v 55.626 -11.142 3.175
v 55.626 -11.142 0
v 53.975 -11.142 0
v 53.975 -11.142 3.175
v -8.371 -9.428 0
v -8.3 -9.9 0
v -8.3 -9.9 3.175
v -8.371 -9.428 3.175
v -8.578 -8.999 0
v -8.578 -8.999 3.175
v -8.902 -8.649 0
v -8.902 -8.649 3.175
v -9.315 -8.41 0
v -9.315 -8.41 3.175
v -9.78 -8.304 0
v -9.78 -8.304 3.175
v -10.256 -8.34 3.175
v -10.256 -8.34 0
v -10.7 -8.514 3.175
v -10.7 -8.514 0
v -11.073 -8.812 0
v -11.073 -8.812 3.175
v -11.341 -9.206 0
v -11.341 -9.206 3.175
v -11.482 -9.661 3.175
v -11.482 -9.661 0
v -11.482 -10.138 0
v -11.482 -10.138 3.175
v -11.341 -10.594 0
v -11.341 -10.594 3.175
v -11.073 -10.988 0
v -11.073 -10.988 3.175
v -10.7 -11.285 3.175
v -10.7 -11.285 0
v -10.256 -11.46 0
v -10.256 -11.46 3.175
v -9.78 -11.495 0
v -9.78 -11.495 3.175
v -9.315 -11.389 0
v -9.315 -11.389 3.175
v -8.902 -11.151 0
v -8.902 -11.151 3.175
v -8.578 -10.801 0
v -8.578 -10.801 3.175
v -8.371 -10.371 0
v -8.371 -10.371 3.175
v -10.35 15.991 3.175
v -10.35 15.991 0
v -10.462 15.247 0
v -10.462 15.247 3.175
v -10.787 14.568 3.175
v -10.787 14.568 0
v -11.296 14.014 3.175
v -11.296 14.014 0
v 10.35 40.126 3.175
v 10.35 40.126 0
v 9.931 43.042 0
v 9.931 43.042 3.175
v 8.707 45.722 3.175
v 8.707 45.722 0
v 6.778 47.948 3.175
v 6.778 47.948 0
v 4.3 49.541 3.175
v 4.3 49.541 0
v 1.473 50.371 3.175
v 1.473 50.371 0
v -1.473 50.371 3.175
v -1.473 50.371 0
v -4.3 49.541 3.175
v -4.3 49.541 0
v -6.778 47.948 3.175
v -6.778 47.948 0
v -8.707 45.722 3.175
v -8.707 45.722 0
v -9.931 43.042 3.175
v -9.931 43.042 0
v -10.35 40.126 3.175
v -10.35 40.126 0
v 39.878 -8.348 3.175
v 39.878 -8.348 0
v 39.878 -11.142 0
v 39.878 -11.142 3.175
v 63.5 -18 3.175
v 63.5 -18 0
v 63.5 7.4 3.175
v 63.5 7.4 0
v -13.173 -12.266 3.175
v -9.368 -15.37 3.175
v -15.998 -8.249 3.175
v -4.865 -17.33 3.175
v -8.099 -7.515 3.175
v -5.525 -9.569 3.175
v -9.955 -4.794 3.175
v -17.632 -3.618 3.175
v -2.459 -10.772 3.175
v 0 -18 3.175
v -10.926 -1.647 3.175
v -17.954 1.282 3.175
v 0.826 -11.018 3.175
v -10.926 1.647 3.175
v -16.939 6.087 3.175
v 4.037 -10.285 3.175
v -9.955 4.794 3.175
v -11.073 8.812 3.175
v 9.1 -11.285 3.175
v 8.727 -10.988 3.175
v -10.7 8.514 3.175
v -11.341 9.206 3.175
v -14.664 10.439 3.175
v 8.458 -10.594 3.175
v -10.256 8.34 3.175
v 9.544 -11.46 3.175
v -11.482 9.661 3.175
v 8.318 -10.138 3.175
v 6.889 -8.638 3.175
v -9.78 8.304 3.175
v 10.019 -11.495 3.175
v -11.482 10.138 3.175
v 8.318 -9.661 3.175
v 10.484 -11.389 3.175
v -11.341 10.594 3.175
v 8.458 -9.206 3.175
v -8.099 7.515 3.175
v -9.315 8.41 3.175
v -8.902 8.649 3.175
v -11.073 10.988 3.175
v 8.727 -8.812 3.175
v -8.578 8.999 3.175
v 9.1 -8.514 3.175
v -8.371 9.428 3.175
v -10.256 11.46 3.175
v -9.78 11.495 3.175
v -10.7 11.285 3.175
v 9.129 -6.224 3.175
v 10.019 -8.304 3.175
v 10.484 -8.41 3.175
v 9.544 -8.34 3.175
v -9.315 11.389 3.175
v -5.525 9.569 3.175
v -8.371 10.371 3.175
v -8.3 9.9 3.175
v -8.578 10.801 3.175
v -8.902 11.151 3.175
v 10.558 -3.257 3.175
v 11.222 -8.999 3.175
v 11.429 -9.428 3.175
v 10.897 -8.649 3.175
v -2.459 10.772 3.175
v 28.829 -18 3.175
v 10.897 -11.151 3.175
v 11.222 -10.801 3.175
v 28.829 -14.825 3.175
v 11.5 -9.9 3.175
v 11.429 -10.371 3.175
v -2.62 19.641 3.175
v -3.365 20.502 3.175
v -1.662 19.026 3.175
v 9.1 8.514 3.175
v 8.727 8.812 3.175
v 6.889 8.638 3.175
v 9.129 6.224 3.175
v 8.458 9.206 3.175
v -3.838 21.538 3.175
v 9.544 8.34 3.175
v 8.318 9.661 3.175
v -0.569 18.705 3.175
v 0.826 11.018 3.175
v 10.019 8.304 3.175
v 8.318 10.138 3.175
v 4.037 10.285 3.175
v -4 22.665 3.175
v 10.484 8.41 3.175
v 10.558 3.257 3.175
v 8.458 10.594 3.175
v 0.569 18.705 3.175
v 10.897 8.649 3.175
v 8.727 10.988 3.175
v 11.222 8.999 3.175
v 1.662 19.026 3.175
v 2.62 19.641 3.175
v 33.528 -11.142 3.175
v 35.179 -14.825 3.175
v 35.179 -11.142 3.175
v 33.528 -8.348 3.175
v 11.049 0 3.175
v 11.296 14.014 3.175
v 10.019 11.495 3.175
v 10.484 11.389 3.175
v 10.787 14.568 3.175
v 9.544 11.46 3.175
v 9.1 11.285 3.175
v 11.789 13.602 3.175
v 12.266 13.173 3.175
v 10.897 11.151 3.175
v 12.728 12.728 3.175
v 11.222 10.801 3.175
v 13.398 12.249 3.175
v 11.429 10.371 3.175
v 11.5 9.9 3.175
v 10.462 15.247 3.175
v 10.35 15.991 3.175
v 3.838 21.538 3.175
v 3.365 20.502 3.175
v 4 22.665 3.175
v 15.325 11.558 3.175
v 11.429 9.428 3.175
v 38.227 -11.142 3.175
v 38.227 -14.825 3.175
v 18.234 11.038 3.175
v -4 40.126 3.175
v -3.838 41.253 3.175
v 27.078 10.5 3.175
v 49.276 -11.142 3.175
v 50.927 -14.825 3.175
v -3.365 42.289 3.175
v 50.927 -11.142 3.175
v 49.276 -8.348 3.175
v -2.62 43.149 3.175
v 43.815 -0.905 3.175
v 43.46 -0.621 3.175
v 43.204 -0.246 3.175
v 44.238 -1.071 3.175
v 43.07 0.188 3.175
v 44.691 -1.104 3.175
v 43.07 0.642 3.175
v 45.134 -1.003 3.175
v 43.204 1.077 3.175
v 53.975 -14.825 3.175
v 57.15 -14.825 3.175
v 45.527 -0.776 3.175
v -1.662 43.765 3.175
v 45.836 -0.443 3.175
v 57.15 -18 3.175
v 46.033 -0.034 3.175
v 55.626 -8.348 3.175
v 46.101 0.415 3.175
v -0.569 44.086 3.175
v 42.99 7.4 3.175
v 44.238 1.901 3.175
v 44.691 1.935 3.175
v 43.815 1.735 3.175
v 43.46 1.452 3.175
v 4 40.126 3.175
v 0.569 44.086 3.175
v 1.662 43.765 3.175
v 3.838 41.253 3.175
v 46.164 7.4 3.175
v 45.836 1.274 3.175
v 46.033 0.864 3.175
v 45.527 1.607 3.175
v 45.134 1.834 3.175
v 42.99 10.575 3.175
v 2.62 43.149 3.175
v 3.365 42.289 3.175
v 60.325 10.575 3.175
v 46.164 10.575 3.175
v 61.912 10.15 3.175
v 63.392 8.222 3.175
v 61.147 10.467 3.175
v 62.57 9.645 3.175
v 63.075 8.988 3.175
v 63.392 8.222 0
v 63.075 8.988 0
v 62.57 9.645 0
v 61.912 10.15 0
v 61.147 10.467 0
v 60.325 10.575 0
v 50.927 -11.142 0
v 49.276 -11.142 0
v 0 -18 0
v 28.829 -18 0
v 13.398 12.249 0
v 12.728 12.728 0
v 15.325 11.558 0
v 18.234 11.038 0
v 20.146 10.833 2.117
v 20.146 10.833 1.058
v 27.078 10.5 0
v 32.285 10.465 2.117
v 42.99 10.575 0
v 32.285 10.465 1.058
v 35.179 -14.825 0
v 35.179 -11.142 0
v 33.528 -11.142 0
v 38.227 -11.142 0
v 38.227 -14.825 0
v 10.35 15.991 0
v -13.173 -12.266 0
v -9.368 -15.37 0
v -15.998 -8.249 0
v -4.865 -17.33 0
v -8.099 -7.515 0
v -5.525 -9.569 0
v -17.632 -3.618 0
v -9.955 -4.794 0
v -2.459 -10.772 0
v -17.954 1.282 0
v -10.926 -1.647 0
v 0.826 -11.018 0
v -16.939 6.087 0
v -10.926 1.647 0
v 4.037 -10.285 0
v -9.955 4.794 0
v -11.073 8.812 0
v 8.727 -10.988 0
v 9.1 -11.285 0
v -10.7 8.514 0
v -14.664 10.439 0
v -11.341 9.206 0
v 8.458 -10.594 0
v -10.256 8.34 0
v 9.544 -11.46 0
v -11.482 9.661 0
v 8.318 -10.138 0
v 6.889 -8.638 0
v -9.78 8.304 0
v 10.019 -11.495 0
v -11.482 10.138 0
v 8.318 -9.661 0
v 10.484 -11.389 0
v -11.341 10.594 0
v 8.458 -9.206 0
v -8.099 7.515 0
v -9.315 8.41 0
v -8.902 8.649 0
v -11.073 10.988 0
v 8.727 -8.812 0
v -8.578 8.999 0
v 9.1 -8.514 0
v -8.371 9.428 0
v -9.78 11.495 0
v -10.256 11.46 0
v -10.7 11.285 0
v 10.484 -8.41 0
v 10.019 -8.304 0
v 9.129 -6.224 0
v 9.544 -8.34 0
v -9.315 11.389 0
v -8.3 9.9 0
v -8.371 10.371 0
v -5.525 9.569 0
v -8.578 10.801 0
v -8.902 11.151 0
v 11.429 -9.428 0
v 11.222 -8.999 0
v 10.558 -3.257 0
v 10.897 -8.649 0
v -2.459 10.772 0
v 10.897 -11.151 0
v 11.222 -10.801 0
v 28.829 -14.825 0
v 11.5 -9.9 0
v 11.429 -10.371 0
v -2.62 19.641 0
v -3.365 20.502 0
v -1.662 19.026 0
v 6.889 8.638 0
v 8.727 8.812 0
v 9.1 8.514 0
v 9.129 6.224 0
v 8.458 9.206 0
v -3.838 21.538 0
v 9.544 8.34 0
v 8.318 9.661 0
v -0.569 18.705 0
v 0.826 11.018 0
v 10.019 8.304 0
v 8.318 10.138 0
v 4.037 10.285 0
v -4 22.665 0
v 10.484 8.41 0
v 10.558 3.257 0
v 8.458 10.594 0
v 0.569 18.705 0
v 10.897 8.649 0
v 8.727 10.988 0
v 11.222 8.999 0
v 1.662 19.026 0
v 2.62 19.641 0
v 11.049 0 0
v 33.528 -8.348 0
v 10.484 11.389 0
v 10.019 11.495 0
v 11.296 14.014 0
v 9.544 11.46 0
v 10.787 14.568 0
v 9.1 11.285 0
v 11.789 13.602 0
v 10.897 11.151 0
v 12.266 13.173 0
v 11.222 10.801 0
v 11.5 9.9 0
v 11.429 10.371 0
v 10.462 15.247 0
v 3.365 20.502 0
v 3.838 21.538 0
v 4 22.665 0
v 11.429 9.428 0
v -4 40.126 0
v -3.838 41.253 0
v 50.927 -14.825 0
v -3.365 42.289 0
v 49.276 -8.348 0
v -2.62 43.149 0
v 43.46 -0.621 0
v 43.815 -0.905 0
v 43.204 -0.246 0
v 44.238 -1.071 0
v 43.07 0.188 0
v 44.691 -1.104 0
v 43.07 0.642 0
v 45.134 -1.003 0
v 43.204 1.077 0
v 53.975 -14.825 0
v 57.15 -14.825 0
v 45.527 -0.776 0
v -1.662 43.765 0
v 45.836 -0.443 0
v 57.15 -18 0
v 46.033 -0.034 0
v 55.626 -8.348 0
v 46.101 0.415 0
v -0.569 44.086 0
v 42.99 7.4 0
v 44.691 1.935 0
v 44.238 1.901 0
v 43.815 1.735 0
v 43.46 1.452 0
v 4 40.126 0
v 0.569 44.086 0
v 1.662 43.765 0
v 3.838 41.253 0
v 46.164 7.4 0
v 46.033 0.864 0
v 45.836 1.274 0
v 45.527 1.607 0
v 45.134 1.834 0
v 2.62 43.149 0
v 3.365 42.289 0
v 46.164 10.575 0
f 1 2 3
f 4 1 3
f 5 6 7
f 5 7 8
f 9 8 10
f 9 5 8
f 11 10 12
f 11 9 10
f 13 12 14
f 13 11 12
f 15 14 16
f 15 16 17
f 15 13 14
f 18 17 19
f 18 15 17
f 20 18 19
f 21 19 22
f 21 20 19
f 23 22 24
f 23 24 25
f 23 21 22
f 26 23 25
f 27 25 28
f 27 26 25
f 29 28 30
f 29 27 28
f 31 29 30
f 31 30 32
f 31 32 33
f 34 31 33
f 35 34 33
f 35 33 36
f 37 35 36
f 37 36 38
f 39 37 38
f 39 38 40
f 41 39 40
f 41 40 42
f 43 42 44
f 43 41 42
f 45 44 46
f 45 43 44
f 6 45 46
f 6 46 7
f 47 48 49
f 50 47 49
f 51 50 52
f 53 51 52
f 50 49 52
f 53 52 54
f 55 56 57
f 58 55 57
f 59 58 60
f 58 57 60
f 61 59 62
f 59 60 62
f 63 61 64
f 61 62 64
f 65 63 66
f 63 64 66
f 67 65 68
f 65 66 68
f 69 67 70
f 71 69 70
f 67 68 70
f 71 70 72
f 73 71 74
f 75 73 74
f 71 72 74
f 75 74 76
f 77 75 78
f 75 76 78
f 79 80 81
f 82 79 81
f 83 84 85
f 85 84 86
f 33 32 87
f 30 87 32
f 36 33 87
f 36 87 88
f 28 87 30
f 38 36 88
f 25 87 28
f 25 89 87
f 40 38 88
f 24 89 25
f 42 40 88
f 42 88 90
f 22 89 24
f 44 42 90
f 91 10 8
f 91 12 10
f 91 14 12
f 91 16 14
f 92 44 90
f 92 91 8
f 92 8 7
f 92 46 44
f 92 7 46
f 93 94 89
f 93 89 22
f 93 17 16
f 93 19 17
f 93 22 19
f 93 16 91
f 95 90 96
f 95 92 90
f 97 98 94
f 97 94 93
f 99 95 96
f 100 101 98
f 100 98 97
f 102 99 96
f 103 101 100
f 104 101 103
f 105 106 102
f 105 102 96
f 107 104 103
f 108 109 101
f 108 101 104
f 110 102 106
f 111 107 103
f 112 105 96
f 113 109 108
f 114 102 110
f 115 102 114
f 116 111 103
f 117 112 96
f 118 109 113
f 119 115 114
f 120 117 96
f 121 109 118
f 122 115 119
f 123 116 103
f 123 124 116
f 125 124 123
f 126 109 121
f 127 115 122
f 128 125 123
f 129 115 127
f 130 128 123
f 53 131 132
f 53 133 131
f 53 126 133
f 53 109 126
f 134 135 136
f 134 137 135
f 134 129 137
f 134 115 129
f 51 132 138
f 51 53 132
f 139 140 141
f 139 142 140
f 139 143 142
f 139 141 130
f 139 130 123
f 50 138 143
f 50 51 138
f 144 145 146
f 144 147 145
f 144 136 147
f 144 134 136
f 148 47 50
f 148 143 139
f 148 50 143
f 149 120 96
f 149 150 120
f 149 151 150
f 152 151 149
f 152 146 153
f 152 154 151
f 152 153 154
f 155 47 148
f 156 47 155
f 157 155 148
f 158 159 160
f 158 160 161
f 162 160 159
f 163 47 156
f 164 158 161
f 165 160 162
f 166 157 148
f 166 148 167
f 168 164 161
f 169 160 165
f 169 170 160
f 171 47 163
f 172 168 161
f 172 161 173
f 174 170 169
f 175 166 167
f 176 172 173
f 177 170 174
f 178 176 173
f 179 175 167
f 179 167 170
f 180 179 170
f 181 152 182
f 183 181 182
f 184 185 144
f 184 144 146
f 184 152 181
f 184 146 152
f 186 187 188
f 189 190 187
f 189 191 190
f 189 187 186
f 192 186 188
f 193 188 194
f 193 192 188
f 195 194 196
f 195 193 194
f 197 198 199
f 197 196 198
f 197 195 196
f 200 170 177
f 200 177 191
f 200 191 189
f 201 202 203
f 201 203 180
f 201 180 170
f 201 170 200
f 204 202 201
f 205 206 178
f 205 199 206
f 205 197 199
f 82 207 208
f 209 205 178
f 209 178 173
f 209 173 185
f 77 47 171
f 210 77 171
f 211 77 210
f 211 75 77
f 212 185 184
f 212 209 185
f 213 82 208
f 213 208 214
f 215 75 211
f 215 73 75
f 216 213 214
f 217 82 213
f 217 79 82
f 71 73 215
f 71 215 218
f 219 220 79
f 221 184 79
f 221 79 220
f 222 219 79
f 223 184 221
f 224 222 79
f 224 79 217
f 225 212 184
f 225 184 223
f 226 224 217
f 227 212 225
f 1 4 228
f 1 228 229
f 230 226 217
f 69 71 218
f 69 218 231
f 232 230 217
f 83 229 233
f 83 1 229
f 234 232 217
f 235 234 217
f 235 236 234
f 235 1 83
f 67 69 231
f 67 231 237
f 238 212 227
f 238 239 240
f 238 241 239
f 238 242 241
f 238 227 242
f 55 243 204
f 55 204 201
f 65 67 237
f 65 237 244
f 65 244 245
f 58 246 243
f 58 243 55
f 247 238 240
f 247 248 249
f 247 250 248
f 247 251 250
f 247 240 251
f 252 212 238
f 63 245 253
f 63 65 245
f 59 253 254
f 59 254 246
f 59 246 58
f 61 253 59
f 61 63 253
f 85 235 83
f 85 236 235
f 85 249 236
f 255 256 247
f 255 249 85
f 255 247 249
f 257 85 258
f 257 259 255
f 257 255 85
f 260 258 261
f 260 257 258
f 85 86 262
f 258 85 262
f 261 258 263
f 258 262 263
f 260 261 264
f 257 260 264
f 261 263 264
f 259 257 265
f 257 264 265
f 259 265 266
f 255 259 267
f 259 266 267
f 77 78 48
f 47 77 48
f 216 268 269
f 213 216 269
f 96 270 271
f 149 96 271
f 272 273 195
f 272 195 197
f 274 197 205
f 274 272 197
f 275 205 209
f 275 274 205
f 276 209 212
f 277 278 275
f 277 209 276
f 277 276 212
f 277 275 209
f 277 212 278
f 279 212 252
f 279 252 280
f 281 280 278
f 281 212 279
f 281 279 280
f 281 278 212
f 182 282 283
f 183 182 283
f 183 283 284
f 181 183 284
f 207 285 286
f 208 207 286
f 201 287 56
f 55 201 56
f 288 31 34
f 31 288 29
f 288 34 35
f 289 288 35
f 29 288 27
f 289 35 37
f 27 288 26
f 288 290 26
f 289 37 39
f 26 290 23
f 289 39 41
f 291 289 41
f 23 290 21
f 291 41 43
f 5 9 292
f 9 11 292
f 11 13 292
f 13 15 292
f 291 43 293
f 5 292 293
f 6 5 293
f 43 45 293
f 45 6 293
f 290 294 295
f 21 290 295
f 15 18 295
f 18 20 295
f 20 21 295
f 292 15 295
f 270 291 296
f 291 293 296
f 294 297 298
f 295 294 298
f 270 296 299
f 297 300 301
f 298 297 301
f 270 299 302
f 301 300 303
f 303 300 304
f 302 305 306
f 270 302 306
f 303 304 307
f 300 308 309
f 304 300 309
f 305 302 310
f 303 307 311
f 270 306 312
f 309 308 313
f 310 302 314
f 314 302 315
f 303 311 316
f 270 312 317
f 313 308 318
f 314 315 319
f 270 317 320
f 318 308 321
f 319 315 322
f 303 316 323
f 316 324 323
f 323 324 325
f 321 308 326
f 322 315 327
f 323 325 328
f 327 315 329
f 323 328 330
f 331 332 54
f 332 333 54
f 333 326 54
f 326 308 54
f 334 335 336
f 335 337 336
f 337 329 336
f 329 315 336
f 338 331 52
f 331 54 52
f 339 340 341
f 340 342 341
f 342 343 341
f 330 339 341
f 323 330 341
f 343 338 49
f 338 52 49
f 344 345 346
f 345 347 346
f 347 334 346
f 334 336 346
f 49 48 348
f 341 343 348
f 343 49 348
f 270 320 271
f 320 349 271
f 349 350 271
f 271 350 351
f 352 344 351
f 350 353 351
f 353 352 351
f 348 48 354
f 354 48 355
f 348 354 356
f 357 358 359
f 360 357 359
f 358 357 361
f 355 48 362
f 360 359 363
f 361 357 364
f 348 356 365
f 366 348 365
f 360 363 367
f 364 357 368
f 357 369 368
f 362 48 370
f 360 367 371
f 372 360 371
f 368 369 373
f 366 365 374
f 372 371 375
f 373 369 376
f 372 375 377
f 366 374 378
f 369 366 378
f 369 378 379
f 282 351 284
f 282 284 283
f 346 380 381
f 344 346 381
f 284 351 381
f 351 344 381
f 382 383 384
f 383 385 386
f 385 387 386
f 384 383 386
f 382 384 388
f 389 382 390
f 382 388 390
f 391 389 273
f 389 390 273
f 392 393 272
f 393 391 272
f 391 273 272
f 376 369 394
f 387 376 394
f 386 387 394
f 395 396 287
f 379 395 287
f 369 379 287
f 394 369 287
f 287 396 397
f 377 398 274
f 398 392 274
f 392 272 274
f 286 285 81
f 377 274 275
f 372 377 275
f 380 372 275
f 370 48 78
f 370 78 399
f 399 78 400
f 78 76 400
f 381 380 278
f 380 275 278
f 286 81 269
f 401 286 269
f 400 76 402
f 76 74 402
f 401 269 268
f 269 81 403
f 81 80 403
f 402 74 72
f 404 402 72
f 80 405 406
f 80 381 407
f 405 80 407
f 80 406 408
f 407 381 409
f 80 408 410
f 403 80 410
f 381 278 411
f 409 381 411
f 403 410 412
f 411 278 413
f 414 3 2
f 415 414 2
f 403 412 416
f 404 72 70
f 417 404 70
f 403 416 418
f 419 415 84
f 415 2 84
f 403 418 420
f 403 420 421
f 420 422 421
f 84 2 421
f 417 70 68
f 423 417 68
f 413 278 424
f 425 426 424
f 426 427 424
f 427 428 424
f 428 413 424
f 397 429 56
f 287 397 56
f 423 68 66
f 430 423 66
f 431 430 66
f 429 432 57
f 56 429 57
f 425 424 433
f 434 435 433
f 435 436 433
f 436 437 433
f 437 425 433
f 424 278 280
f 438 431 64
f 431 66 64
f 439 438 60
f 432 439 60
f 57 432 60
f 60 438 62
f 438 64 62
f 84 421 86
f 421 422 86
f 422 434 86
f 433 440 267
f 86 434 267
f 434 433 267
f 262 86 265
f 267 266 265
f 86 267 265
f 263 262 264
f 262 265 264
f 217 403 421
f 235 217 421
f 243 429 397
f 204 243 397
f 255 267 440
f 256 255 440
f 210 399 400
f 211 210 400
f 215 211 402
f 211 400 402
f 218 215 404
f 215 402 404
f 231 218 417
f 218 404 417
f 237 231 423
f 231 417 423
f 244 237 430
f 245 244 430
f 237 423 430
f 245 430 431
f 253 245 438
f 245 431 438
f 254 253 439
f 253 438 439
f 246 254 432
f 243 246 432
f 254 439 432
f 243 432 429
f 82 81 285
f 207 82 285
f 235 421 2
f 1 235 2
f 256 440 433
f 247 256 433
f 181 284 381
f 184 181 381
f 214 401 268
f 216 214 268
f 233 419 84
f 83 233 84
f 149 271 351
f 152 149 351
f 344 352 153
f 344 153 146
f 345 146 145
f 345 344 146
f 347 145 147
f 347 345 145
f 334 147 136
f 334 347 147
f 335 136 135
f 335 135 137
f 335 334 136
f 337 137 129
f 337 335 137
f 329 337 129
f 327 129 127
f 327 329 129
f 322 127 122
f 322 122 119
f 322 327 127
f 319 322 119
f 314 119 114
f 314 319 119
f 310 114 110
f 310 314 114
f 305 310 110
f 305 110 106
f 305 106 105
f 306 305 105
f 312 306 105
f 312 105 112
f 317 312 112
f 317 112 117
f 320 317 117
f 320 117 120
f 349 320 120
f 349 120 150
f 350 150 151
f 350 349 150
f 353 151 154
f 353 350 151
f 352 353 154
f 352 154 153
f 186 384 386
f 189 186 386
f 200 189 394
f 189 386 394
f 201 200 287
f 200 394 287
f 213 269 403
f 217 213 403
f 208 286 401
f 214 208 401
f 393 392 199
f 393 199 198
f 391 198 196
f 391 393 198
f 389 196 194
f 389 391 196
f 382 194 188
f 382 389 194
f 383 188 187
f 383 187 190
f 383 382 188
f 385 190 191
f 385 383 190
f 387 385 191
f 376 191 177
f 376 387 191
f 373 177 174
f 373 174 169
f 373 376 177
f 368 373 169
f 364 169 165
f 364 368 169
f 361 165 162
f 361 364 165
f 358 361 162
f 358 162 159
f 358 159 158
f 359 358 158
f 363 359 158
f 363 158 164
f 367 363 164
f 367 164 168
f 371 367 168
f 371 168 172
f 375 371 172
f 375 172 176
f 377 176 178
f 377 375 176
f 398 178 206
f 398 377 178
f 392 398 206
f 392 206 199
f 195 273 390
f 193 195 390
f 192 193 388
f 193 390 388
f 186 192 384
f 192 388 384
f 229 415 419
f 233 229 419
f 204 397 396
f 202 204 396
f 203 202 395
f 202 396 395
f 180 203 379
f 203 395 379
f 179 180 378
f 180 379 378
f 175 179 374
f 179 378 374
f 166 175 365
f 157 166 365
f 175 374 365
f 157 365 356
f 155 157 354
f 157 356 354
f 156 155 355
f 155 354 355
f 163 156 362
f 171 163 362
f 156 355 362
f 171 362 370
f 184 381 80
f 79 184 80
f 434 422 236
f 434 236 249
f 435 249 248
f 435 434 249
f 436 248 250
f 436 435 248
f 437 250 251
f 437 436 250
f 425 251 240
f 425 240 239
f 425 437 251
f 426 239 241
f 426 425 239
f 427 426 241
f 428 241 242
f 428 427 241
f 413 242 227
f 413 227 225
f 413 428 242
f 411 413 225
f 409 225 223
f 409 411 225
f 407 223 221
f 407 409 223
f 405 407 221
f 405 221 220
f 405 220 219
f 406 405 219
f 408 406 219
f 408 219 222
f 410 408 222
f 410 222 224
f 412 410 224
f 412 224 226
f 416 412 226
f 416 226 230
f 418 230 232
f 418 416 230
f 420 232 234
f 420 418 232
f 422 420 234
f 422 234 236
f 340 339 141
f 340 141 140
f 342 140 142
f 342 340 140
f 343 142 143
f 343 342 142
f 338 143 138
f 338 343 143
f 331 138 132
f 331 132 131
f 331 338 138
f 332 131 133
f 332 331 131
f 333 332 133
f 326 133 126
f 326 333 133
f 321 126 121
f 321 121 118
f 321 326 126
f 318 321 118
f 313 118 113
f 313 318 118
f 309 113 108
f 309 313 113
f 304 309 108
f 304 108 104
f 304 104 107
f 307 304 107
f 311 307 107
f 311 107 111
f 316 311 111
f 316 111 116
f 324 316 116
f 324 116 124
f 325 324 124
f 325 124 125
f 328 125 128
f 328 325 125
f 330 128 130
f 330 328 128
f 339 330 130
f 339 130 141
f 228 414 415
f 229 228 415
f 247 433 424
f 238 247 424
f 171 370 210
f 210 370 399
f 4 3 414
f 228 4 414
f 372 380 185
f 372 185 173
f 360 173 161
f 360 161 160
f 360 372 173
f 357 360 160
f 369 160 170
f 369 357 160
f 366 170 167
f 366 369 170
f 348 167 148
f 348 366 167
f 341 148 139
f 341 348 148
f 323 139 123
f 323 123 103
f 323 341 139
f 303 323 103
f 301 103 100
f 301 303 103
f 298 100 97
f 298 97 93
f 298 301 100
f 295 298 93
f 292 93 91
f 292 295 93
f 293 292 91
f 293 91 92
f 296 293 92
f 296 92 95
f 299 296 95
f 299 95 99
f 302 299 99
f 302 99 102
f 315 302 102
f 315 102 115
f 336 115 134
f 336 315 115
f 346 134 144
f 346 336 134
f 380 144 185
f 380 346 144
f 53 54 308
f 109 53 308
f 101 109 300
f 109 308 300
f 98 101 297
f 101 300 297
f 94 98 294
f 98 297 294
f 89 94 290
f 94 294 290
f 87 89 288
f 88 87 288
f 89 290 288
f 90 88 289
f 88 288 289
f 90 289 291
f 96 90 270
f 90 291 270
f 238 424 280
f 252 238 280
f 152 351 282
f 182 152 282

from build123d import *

# Parameters (mm, degrees)
SKETCH1_R           = 11.049
SKETCH1_R_2         = 1.6
SKETCH1_R_3         = 1.524
BOSS_EXTRUDE1_DEPTH = 3.175


with BuildPart() as part:
    # Sketch1 → Boss-Extrude1 (new body)
    with BuildSketch(Plane.XY):
        with BuildLine():
            Line((57.15, -17.99971), (63.5, -17.99971))
            Line((63.5, -17.99971), (63.5, 7.40029))
            ThreePointArc((63.5, 7.40029), (62.57006403, 9.64535403), (60.325, 10.57529))
            Line((60.325, 10.57529), (46.1645, 10.57529))
            Line((46.1645, 10.57529), (46.1645, 7.40029))
            Line((46.1645, 7.40029), (42.9895, 7.40029))
            Line((42.9895, 7.40029), (42.9895, 10.57529))
            add(Edge.make_bspline(
                [(12.727717, 12.727717), (15.734639389, 9.720794612), (35.054158727, 10.57529), (42.9895, 10.57529)],
                knots=[0, 0, 0, 0, 1, 1, 1, 1], degree=3))
            ThreePointArc((12.727717, 12.727717), (12.029263941, 13.389786), (11.296423453, 14.013578318))
            ThreePointArc((11.296423453, 14.013578318), (10.59915166, 14.89503307), (10.3505, 15.991081784))
            Line((10.3505, 15.991081784), (10.3505, 40.126055474))
            ThreePointArc((10.3505, 40.126055474), (0, 50.476555474), (-10.3505, 40.126055474))
            Line((-10.3505, 40.126055474), (-10.3505, 15.991081784))
            ThreePointArc((-10.3505, 15.991081784), (-10.59915166, 14.89503307), (-11.296423453, 14.013578318))
            ThreePointArc((-11.296423453, 14.013578318), (-16.973949244, -5.989541481), (0, -17.99971))
            Line((0, -17.99971), (28.829, -17.99971))
            Line((28.829, -17.99971), (28.829, -14.82471))
            Line((28.829, -14.82471), (35.179, -14.82471))
            Line((35.179, -14.82471), (35.179, -11.14171))
            Line((35.179, -11.14171), (33.528, -11.14171))
            Line((33.528, -11.14171), (33.528, -8.34771))
            Line((33.528, -8.34771), (39.878, -8.34771))
            Line((39.878, -8.34771), (39.878, -11.14171))
            Line((39.878, -11.14171), (38.227, -11.14171))
            Line((38.227, -11.14171), (38.227, -14.82471))
            Line((38.227, -14.82471), (50.927, -14.82471))
            Line((50.927, -14.82471), (50.927, -11.14171))
            Line((50.927, -11.14171), (49.276, -11.14171))
            Line((49.276, -11.14171), (49.276, -8.34771))
            Line((49.276, -8.34771), (55.626, -8.34771))
            Line((55.626, -8.34771), (55.626, -11.14171))
            Line((55.626, -11.14171), (53.975, -11.14171))
            Line((53.975, -11.14171), (53.975, -14.82471))
            Line((53.975, -14.82471), (57.15, -14.82471))
            Line((57.15, -14.82471), (57.15, -17.99971))
        make_face()
        Circle(SKETCH1_R, mode=Mode.SUBTRACT)
        with Locations((9.899834348, 9.899834348)):
            Circle(SKETCH1_R_2, mode=Mode.SUBTRACT)
        with Locations((9.899834348, -9.899834348)):
            Circle(SKETCH1_R_2, mode=Mode.SUBTRACT)
        with Locations((-9.899834348, -9.899834348)):
            Circle(SKETCH1_R_2, mode=Mode.SUBTRACT)
        with Locations((-9.899834348, 9.899834348)):
            Circle(SKETCH1_R_2, mode=Mode.SUBTRACT)
        with Locations((44.577, 0.41529)):
            Circle(SKETCH1_R_3, mode=Mode.SUBTRACT)
        with BuildLine():
            Line((4.0005, 40.126055474), (4.0005, 22.664731685))
            ThreePointArc((4.0005, 22.664731685), (0, 18.664231685), (-4.0005, 22.664731685))
            Line((-4.0005, 22.664731685), (-4.0005, 40.126055474))
            ThreePointArc((-4.0005, 40.126055474), (0, 44.126555474), (4.0005, 40.126055474))
        make_face(mode=Mode.SUBTRACT)
    extrude(amount=BOSS_EXTRUDE1_DEPTH)


solid = part.part
